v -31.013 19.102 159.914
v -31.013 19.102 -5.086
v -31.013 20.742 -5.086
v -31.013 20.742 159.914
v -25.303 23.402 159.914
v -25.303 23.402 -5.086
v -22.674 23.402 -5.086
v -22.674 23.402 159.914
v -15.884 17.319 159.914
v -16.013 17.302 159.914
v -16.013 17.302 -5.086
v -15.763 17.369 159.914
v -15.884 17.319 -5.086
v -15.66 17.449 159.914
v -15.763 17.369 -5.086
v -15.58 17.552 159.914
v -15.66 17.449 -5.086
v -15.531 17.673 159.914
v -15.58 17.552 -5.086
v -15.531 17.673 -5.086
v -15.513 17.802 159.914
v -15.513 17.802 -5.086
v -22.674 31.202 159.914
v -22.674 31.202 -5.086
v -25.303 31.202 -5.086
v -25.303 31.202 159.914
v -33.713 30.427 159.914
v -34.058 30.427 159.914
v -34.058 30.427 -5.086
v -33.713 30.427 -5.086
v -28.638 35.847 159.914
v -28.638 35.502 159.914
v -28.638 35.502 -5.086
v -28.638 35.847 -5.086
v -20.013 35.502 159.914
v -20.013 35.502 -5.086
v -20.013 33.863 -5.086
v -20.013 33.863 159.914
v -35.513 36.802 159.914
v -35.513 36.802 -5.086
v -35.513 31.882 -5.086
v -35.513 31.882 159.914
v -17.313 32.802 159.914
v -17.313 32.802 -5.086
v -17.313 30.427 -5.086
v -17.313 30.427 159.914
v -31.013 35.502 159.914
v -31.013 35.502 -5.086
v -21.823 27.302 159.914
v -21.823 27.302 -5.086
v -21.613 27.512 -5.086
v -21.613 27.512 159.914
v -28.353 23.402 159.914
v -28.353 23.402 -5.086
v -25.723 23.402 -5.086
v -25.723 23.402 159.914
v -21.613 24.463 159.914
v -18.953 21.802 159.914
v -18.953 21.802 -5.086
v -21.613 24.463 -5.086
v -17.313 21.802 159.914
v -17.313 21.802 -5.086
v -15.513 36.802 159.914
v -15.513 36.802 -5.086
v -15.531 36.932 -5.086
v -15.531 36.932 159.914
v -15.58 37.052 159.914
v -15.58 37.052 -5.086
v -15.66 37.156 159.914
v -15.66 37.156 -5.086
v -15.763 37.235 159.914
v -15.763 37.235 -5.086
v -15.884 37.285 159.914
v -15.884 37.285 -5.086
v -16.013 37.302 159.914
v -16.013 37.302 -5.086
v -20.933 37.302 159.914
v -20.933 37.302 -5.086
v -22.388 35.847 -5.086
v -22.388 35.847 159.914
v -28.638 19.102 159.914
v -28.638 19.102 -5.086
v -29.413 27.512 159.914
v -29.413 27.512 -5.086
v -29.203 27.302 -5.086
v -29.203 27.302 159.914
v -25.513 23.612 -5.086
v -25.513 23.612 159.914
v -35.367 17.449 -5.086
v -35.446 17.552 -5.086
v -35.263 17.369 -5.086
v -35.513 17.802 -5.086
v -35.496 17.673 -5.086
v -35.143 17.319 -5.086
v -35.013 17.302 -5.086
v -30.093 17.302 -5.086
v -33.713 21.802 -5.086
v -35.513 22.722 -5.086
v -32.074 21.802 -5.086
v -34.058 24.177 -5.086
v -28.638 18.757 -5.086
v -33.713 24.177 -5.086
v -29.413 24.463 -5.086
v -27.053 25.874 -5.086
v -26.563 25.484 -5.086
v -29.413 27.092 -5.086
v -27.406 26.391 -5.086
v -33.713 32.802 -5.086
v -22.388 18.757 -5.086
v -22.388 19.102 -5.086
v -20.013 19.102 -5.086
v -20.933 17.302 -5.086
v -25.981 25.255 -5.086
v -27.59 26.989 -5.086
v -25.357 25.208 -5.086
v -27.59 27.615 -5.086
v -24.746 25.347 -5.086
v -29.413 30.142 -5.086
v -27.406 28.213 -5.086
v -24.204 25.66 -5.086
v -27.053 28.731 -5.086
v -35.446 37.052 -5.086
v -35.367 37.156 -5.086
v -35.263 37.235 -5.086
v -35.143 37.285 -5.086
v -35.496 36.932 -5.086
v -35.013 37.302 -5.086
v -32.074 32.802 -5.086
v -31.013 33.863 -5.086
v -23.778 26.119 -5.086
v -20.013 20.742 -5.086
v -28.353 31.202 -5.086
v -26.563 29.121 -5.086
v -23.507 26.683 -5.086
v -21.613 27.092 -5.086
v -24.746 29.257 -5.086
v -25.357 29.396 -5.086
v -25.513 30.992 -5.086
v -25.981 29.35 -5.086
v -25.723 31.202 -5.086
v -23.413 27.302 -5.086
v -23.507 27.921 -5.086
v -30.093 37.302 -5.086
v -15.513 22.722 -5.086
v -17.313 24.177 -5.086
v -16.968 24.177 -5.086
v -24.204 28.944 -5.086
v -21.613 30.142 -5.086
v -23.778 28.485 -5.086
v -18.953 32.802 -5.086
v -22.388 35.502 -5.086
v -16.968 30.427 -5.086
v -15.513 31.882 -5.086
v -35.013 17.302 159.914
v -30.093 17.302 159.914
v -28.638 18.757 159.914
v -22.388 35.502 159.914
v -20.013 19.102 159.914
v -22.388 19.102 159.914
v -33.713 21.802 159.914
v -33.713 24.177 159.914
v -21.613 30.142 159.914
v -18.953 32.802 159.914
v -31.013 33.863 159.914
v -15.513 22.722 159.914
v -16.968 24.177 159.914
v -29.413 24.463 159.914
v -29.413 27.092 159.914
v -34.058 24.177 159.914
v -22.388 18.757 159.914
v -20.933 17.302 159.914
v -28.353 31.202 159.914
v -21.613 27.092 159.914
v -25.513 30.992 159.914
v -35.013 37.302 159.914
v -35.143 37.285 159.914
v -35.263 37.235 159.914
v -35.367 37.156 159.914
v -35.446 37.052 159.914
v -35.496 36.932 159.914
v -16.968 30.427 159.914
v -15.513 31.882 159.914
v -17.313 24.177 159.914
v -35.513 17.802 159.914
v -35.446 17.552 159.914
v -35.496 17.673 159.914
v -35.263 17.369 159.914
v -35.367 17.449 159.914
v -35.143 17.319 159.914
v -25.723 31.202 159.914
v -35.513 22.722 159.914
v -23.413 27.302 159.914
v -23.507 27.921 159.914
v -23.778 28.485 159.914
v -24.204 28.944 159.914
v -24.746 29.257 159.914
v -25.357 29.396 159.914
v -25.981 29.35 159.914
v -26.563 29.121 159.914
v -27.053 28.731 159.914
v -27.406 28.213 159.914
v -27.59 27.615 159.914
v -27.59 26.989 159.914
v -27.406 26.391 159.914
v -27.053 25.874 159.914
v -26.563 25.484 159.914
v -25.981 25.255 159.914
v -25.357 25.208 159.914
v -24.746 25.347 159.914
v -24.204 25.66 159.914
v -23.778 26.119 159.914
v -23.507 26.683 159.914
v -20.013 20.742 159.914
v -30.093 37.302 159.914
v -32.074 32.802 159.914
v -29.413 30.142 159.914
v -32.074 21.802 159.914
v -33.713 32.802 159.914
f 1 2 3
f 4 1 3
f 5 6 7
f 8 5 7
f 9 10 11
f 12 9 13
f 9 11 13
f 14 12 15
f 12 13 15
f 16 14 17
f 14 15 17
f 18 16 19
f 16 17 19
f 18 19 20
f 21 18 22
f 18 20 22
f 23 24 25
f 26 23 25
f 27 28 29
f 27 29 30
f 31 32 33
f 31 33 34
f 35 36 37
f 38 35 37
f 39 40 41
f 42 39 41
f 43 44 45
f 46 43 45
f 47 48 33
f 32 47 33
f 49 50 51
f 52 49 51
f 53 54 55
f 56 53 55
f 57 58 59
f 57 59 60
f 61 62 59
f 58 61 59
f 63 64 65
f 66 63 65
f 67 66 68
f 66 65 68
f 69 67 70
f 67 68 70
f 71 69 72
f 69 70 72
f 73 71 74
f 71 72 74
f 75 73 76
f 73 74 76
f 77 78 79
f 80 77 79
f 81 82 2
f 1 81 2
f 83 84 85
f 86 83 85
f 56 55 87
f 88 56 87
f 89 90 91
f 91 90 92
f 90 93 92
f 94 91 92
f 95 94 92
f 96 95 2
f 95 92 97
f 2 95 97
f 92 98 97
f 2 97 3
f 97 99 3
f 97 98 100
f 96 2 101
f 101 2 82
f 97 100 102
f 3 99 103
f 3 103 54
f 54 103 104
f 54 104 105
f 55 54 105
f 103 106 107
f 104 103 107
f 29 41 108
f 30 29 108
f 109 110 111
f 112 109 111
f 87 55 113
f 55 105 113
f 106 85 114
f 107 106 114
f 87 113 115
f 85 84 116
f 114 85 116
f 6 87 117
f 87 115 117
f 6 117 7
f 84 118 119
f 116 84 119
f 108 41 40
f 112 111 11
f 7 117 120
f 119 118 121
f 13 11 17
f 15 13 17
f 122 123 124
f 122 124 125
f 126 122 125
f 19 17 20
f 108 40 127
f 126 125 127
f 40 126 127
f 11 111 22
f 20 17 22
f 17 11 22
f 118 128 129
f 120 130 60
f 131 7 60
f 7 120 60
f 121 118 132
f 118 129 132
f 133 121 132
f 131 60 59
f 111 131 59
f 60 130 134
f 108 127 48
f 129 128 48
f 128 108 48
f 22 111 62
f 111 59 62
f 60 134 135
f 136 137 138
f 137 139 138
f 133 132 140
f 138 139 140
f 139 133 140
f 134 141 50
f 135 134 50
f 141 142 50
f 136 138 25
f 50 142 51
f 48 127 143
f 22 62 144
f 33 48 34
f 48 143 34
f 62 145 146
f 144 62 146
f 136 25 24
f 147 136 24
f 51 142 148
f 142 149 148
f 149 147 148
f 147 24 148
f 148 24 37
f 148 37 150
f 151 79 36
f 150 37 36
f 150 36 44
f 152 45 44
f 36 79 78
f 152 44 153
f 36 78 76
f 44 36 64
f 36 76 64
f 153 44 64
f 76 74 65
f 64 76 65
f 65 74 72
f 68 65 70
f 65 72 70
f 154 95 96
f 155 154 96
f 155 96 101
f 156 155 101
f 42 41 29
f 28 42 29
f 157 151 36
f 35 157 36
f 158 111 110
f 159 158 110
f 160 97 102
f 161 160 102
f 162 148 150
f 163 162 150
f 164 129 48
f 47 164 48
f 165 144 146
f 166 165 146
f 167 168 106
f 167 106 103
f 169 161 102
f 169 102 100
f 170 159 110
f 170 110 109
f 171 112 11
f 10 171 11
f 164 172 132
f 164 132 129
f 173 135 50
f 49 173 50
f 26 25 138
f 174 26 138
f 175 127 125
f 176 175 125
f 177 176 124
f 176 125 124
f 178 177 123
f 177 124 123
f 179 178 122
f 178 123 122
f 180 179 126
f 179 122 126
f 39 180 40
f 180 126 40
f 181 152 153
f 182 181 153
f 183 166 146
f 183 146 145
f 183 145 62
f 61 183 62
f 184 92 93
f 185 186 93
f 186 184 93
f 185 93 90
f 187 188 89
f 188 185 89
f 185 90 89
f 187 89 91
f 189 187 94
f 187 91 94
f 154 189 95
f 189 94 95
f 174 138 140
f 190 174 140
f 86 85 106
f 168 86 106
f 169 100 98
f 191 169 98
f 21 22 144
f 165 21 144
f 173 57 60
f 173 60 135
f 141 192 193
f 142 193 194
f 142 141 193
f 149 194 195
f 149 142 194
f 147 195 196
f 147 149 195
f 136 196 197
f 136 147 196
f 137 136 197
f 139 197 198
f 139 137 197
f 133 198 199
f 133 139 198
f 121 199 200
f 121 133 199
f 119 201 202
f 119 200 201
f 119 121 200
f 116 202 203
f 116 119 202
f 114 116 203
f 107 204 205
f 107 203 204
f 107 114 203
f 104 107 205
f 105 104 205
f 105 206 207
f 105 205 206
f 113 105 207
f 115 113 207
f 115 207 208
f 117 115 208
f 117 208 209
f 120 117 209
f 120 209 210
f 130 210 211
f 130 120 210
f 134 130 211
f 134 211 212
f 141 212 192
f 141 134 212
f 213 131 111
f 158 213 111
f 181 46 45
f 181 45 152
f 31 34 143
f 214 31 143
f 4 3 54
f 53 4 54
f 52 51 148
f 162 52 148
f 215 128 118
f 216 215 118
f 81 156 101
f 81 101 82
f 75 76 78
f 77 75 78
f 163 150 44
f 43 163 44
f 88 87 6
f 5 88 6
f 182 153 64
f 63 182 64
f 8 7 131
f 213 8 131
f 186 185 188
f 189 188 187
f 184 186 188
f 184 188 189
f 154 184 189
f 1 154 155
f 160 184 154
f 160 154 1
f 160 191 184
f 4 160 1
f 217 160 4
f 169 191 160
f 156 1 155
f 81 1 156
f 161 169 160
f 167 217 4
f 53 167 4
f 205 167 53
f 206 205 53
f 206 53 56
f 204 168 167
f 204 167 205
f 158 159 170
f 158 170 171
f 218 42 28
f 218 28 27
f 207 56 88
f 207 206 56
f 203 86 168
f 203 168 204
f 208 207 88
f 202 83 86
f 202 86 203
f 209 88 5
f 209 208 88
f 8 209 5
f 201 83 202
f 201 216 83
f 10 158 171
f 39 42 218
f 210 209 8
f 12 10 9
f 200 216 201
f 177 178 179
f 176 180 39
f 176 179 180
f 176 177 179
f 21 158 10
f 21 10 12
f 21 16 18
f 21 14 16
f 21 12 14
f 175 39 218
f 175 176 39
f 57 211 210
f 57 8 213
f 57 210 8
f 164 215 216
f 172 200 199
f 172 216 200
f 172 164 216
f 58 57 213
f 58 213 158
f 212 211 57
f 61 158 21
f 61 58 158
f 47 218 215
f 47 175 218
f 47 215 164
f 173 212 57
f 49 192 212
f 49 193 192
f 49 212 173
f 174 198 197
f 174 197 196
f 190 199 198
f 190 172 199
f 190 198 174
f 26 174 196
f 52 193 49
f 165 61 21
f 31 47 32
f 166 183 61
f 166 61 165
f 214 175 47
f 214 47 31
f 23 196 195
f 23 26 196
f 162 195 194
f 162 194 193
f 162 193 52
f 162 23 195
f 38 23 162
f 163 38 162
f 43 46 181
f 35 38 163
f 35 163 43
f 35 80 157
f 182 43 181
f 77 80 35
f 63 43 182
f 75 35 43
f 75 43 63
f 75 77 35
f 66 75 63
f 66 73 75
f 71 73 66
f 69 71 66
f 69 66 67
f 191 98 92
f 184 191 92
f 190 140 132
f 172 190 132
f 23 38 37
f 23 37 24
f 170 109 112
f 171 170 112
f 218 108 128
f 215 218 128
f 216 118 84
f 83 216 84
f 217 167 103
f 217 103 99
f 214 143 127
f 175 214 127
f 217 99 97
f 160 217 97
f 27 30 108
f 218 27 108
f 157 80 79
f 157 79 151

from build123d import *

# Parameters (mm, degrees)
V_SLOT_START                           = -5.085646751
V_SLOT_20X20X500_LINEAR_RAIL_OUTLINE_R = 2.1
V_SLOT_20X20X500_LINEAR_RAIL_DEPTH     = 500
SKETCH1_W                              = 20
SKETCH1_H                              = 335
CUT_EXTRUDE1_DEPTH                     = 497.589794047


# Read off the part's stored shape, not the designer's step: V-Slot 20x20x500 Linear Rail
with BuildPart() as part:
    # V-Slot 20x20x500 Linear Rail outline → V-Slot 20x20x500 Linear Rail (new body)
    with BuildSketch(Plane.XY.offset(V_SLOT_START)):
        with BuildLine():
            Line((-21.613469268, 24.462926439), (-21.613469268, 27.092266268))
            Line((-21.613469268, 27.092266268), (-21.823469268, 27.302266268))
            Line((-21.823469268, 27.302266268), (-21.613469268, 27.512266268))
            Line((-21.613469268, 27.512266268), (-21.613469268, 30.141606096))
            Line((-21.613469268, 30.141606096), (-18.952809096, 32.802266268))
            Line((-18.952809096, 32.802266268), (-17.313469268, 32.802266268))
            Line((-17.313469268, 32.802266268), (-17.313469268, 30.427266268))
            Line((-17.313469268, 30.427266268), (-16.968469268, 30.427266268))
            Line((-16.968469268, 30.427266268), (-15.513469268, 31.882266268))
            Line((-15.513469268, 31.882266268), (-15.513469268, 36.802266268))
            ThreePointArc((-15.513469268, 36.802266268), (-15.659915878, 37.155819658), (-16.013469268, 37.302266268))
            Line((-16.013469268, 37.302266268), (-20.933469268, 37.302266268))
            Line((-20.933469268, 37.302266268), (-22.388469268, 35.847266268))
            Line((-22.388469268, 35.847266268), (-22.388469268, 35.502266268))
            Line((-22.388469268, 35.502266268), (-20.013469268, 35.502266268))
            Line((-20.013469268, 35.502266268), (-20.013469268, 33.862926439))
            Line((-20.013469268, 33.862926439), (-22.67412944, 31.202266268))
            Line((-22.67412944, 31.202266268), (-25.303469268, 31.202266268))
            Line((-25.303469268, 31.202266268), (-25.513469268, 30.992266268))
            Line((-25.513469268, 30.992266268), (-25.723469268, 31.202266268))
            Line((-25.723469268, 31.202266268), (-28.352809096, 31.202266268))
            Line((-28.352809096, 31.202266268), (-31.013469268, 33.862926439))
            Line((-31.013469268, 33.862926439), (-31.013469268, 35.502266268))
            Line((-31.013469268, 35.502266268), (-28.638469268, 35.502266268))
            Line((-28.638469268, 35.502266268), (-28.638469268, 35.847266268))
            Line((-28.638469268, 35.847266268), (-30.093469268, 37.302266268))
            Line((-30.093469268, 37.302266268), (-35.013469268, 37.302266268))
            ThreePointArc((-35.013469268, 37.302266268), (-35.367022659, 37.155819658), (-35.513469268, 36.802266268))
            Line((-35.513469268, 36.802266268), (-35.513469268, 31.882266268))
            Line((-35.513469268, 31.882266268), (-34.058469268, 30.427266268))
            Line((-34.058469268, 30.427266268), (-33.713469268, 30.427266268))
            Line((-33.713469268, 30.427266268), (-33.713469268, 32.802266268))
            Line((-33.713469268, 32.802266268), (-32.07412944, 32.802266268))
            Line((-32.07412944, 32.802266268), (-29.413469268, 30.141606096))
            Line((-29.413469268, 30.141606096), (-29.413469268, 27.512266268))
            Line((-29.413469268, 27.512266268), (-29.203469268, 27.302266268))
            Line((-29.203469268, 27.302266268), (-29.413469268, 27.092266268))
            Line((-29.413469268, 27.092266268), (-29.413469268, 24.462926439))
            Line((-29.413469268, 24.462926439), (-32.07412944, 21.802266268))
            Line((-32.07412944, 21.802266268), (-33.713469268, 21.802266268))
            Line((-33.713469268, 21.802266268), (-33.713469268, 24.177266268))
            Line((-33.713469268, 24.177266268), (-34.058469268, 24.177266268))
            Line((-34.058469268, 24.177266268), (-35.513469268, 22.722266268))
            Line((-35.513469268, 22.722266268), (-35.513469268, 17.802266268))
            ThreePointArc((-35.513469268, 17.802266268), (-35.367022659, 17.448712877), (-35.013469268, 17.302266268))
            Line((-35.013469268, 17.302266268), (-30.093469268, 17.302266268))
            Line((-30.093469268, 17.302266268), (-28.638469268, 18.757266268))
            Line((-28.638469268, 18.757266268), (-28.638469268, 19.102266268))
            Line((-28.638469268, 19.102266268), (-31.013469268, 19.102266268))
            Line((-31.013469268, 19.102266268), (-31.013469268, 20.741606096))
            Line((-31.013469268, 20.741606096), (-28.352809096, 23.402266268))
            Line((-28.352809096, 23.402266268), (-25.723469268, 23.402266268))
            Line((-25.723469268, 23.402266268), (-25.513469268, 23.612266268))
            Line((-25.513469268, 23.612266268), (-25.303469268, 23.402266268))
            Line((-25.303469268, 23.402266268), (-22.67412944, 23.402266268))
            Line((-22.67412944, 23.402266268), (-20.013469268, 20.741606096))
            Line((-20.013469268, 20.741606096), (-20.013469268, 19.102266268))
            Line((-20.013469268, 19.102266268), (-22.388469268, 19.102266268))
            Line((-22.388469268, 19.102266268), (-22.388469268, 18.757266268))
            Line((-22.388469268, 18.757266268), (-20.933469268, 17.302266268))
            Line((-20.933469268, 17.302266268), (-16.013469268, 17.302266268))
            ThreePointArc((-16.013469268, 17.302266268), (-15.659915877, 17.448712878), (-15.513469268, 17.802266268))
            Line((-15.513469268, 17.802266268), (-15.513469268, 22.722266268))
            Line((-15.513469268, 22.722266268), (-16.968469268, 24.177266268))
            Line((-16.968469268, 24.177266268), (-17.313469268, 24.177266268))
            Line((-17.313469268, 24.177266268), (-17.313469268, 21.802266268))
            Line((-17.313469268, 21.802266268), (-18.952809096, 21.802266268))
            Line((-18.952809096, 21.802266268), (-21.613469268, 24.462926439))
        make_face()
        with Locations((-25.513469268, 27.302266268)):
            Circle(V_SLOT_20X20X500_LINEAR_RAIL_OUTLINE_R, mode=Mode.SUBTRACT)
    extrude(amount=V_SLOT_20X20X500_LINEAR_RAIL_DEPTH)

    # Sketch1 → Cut-Extrude1 (cut, through all)
    with BuildSketch(Plane(origin=(0, 37.302266268, 0), x_dir=(1, 0, 0), z_dir=(0, 1, 0))):
        with Locations((-25.513469268, -327.414353249)):
            Rectangle(SKETCH1_W, SKETCH1_H)
    extrude(amount=-CUT_EXTRUDE1_DEPTH, mode=Mode.SUBTRACT)


solid = part.part
